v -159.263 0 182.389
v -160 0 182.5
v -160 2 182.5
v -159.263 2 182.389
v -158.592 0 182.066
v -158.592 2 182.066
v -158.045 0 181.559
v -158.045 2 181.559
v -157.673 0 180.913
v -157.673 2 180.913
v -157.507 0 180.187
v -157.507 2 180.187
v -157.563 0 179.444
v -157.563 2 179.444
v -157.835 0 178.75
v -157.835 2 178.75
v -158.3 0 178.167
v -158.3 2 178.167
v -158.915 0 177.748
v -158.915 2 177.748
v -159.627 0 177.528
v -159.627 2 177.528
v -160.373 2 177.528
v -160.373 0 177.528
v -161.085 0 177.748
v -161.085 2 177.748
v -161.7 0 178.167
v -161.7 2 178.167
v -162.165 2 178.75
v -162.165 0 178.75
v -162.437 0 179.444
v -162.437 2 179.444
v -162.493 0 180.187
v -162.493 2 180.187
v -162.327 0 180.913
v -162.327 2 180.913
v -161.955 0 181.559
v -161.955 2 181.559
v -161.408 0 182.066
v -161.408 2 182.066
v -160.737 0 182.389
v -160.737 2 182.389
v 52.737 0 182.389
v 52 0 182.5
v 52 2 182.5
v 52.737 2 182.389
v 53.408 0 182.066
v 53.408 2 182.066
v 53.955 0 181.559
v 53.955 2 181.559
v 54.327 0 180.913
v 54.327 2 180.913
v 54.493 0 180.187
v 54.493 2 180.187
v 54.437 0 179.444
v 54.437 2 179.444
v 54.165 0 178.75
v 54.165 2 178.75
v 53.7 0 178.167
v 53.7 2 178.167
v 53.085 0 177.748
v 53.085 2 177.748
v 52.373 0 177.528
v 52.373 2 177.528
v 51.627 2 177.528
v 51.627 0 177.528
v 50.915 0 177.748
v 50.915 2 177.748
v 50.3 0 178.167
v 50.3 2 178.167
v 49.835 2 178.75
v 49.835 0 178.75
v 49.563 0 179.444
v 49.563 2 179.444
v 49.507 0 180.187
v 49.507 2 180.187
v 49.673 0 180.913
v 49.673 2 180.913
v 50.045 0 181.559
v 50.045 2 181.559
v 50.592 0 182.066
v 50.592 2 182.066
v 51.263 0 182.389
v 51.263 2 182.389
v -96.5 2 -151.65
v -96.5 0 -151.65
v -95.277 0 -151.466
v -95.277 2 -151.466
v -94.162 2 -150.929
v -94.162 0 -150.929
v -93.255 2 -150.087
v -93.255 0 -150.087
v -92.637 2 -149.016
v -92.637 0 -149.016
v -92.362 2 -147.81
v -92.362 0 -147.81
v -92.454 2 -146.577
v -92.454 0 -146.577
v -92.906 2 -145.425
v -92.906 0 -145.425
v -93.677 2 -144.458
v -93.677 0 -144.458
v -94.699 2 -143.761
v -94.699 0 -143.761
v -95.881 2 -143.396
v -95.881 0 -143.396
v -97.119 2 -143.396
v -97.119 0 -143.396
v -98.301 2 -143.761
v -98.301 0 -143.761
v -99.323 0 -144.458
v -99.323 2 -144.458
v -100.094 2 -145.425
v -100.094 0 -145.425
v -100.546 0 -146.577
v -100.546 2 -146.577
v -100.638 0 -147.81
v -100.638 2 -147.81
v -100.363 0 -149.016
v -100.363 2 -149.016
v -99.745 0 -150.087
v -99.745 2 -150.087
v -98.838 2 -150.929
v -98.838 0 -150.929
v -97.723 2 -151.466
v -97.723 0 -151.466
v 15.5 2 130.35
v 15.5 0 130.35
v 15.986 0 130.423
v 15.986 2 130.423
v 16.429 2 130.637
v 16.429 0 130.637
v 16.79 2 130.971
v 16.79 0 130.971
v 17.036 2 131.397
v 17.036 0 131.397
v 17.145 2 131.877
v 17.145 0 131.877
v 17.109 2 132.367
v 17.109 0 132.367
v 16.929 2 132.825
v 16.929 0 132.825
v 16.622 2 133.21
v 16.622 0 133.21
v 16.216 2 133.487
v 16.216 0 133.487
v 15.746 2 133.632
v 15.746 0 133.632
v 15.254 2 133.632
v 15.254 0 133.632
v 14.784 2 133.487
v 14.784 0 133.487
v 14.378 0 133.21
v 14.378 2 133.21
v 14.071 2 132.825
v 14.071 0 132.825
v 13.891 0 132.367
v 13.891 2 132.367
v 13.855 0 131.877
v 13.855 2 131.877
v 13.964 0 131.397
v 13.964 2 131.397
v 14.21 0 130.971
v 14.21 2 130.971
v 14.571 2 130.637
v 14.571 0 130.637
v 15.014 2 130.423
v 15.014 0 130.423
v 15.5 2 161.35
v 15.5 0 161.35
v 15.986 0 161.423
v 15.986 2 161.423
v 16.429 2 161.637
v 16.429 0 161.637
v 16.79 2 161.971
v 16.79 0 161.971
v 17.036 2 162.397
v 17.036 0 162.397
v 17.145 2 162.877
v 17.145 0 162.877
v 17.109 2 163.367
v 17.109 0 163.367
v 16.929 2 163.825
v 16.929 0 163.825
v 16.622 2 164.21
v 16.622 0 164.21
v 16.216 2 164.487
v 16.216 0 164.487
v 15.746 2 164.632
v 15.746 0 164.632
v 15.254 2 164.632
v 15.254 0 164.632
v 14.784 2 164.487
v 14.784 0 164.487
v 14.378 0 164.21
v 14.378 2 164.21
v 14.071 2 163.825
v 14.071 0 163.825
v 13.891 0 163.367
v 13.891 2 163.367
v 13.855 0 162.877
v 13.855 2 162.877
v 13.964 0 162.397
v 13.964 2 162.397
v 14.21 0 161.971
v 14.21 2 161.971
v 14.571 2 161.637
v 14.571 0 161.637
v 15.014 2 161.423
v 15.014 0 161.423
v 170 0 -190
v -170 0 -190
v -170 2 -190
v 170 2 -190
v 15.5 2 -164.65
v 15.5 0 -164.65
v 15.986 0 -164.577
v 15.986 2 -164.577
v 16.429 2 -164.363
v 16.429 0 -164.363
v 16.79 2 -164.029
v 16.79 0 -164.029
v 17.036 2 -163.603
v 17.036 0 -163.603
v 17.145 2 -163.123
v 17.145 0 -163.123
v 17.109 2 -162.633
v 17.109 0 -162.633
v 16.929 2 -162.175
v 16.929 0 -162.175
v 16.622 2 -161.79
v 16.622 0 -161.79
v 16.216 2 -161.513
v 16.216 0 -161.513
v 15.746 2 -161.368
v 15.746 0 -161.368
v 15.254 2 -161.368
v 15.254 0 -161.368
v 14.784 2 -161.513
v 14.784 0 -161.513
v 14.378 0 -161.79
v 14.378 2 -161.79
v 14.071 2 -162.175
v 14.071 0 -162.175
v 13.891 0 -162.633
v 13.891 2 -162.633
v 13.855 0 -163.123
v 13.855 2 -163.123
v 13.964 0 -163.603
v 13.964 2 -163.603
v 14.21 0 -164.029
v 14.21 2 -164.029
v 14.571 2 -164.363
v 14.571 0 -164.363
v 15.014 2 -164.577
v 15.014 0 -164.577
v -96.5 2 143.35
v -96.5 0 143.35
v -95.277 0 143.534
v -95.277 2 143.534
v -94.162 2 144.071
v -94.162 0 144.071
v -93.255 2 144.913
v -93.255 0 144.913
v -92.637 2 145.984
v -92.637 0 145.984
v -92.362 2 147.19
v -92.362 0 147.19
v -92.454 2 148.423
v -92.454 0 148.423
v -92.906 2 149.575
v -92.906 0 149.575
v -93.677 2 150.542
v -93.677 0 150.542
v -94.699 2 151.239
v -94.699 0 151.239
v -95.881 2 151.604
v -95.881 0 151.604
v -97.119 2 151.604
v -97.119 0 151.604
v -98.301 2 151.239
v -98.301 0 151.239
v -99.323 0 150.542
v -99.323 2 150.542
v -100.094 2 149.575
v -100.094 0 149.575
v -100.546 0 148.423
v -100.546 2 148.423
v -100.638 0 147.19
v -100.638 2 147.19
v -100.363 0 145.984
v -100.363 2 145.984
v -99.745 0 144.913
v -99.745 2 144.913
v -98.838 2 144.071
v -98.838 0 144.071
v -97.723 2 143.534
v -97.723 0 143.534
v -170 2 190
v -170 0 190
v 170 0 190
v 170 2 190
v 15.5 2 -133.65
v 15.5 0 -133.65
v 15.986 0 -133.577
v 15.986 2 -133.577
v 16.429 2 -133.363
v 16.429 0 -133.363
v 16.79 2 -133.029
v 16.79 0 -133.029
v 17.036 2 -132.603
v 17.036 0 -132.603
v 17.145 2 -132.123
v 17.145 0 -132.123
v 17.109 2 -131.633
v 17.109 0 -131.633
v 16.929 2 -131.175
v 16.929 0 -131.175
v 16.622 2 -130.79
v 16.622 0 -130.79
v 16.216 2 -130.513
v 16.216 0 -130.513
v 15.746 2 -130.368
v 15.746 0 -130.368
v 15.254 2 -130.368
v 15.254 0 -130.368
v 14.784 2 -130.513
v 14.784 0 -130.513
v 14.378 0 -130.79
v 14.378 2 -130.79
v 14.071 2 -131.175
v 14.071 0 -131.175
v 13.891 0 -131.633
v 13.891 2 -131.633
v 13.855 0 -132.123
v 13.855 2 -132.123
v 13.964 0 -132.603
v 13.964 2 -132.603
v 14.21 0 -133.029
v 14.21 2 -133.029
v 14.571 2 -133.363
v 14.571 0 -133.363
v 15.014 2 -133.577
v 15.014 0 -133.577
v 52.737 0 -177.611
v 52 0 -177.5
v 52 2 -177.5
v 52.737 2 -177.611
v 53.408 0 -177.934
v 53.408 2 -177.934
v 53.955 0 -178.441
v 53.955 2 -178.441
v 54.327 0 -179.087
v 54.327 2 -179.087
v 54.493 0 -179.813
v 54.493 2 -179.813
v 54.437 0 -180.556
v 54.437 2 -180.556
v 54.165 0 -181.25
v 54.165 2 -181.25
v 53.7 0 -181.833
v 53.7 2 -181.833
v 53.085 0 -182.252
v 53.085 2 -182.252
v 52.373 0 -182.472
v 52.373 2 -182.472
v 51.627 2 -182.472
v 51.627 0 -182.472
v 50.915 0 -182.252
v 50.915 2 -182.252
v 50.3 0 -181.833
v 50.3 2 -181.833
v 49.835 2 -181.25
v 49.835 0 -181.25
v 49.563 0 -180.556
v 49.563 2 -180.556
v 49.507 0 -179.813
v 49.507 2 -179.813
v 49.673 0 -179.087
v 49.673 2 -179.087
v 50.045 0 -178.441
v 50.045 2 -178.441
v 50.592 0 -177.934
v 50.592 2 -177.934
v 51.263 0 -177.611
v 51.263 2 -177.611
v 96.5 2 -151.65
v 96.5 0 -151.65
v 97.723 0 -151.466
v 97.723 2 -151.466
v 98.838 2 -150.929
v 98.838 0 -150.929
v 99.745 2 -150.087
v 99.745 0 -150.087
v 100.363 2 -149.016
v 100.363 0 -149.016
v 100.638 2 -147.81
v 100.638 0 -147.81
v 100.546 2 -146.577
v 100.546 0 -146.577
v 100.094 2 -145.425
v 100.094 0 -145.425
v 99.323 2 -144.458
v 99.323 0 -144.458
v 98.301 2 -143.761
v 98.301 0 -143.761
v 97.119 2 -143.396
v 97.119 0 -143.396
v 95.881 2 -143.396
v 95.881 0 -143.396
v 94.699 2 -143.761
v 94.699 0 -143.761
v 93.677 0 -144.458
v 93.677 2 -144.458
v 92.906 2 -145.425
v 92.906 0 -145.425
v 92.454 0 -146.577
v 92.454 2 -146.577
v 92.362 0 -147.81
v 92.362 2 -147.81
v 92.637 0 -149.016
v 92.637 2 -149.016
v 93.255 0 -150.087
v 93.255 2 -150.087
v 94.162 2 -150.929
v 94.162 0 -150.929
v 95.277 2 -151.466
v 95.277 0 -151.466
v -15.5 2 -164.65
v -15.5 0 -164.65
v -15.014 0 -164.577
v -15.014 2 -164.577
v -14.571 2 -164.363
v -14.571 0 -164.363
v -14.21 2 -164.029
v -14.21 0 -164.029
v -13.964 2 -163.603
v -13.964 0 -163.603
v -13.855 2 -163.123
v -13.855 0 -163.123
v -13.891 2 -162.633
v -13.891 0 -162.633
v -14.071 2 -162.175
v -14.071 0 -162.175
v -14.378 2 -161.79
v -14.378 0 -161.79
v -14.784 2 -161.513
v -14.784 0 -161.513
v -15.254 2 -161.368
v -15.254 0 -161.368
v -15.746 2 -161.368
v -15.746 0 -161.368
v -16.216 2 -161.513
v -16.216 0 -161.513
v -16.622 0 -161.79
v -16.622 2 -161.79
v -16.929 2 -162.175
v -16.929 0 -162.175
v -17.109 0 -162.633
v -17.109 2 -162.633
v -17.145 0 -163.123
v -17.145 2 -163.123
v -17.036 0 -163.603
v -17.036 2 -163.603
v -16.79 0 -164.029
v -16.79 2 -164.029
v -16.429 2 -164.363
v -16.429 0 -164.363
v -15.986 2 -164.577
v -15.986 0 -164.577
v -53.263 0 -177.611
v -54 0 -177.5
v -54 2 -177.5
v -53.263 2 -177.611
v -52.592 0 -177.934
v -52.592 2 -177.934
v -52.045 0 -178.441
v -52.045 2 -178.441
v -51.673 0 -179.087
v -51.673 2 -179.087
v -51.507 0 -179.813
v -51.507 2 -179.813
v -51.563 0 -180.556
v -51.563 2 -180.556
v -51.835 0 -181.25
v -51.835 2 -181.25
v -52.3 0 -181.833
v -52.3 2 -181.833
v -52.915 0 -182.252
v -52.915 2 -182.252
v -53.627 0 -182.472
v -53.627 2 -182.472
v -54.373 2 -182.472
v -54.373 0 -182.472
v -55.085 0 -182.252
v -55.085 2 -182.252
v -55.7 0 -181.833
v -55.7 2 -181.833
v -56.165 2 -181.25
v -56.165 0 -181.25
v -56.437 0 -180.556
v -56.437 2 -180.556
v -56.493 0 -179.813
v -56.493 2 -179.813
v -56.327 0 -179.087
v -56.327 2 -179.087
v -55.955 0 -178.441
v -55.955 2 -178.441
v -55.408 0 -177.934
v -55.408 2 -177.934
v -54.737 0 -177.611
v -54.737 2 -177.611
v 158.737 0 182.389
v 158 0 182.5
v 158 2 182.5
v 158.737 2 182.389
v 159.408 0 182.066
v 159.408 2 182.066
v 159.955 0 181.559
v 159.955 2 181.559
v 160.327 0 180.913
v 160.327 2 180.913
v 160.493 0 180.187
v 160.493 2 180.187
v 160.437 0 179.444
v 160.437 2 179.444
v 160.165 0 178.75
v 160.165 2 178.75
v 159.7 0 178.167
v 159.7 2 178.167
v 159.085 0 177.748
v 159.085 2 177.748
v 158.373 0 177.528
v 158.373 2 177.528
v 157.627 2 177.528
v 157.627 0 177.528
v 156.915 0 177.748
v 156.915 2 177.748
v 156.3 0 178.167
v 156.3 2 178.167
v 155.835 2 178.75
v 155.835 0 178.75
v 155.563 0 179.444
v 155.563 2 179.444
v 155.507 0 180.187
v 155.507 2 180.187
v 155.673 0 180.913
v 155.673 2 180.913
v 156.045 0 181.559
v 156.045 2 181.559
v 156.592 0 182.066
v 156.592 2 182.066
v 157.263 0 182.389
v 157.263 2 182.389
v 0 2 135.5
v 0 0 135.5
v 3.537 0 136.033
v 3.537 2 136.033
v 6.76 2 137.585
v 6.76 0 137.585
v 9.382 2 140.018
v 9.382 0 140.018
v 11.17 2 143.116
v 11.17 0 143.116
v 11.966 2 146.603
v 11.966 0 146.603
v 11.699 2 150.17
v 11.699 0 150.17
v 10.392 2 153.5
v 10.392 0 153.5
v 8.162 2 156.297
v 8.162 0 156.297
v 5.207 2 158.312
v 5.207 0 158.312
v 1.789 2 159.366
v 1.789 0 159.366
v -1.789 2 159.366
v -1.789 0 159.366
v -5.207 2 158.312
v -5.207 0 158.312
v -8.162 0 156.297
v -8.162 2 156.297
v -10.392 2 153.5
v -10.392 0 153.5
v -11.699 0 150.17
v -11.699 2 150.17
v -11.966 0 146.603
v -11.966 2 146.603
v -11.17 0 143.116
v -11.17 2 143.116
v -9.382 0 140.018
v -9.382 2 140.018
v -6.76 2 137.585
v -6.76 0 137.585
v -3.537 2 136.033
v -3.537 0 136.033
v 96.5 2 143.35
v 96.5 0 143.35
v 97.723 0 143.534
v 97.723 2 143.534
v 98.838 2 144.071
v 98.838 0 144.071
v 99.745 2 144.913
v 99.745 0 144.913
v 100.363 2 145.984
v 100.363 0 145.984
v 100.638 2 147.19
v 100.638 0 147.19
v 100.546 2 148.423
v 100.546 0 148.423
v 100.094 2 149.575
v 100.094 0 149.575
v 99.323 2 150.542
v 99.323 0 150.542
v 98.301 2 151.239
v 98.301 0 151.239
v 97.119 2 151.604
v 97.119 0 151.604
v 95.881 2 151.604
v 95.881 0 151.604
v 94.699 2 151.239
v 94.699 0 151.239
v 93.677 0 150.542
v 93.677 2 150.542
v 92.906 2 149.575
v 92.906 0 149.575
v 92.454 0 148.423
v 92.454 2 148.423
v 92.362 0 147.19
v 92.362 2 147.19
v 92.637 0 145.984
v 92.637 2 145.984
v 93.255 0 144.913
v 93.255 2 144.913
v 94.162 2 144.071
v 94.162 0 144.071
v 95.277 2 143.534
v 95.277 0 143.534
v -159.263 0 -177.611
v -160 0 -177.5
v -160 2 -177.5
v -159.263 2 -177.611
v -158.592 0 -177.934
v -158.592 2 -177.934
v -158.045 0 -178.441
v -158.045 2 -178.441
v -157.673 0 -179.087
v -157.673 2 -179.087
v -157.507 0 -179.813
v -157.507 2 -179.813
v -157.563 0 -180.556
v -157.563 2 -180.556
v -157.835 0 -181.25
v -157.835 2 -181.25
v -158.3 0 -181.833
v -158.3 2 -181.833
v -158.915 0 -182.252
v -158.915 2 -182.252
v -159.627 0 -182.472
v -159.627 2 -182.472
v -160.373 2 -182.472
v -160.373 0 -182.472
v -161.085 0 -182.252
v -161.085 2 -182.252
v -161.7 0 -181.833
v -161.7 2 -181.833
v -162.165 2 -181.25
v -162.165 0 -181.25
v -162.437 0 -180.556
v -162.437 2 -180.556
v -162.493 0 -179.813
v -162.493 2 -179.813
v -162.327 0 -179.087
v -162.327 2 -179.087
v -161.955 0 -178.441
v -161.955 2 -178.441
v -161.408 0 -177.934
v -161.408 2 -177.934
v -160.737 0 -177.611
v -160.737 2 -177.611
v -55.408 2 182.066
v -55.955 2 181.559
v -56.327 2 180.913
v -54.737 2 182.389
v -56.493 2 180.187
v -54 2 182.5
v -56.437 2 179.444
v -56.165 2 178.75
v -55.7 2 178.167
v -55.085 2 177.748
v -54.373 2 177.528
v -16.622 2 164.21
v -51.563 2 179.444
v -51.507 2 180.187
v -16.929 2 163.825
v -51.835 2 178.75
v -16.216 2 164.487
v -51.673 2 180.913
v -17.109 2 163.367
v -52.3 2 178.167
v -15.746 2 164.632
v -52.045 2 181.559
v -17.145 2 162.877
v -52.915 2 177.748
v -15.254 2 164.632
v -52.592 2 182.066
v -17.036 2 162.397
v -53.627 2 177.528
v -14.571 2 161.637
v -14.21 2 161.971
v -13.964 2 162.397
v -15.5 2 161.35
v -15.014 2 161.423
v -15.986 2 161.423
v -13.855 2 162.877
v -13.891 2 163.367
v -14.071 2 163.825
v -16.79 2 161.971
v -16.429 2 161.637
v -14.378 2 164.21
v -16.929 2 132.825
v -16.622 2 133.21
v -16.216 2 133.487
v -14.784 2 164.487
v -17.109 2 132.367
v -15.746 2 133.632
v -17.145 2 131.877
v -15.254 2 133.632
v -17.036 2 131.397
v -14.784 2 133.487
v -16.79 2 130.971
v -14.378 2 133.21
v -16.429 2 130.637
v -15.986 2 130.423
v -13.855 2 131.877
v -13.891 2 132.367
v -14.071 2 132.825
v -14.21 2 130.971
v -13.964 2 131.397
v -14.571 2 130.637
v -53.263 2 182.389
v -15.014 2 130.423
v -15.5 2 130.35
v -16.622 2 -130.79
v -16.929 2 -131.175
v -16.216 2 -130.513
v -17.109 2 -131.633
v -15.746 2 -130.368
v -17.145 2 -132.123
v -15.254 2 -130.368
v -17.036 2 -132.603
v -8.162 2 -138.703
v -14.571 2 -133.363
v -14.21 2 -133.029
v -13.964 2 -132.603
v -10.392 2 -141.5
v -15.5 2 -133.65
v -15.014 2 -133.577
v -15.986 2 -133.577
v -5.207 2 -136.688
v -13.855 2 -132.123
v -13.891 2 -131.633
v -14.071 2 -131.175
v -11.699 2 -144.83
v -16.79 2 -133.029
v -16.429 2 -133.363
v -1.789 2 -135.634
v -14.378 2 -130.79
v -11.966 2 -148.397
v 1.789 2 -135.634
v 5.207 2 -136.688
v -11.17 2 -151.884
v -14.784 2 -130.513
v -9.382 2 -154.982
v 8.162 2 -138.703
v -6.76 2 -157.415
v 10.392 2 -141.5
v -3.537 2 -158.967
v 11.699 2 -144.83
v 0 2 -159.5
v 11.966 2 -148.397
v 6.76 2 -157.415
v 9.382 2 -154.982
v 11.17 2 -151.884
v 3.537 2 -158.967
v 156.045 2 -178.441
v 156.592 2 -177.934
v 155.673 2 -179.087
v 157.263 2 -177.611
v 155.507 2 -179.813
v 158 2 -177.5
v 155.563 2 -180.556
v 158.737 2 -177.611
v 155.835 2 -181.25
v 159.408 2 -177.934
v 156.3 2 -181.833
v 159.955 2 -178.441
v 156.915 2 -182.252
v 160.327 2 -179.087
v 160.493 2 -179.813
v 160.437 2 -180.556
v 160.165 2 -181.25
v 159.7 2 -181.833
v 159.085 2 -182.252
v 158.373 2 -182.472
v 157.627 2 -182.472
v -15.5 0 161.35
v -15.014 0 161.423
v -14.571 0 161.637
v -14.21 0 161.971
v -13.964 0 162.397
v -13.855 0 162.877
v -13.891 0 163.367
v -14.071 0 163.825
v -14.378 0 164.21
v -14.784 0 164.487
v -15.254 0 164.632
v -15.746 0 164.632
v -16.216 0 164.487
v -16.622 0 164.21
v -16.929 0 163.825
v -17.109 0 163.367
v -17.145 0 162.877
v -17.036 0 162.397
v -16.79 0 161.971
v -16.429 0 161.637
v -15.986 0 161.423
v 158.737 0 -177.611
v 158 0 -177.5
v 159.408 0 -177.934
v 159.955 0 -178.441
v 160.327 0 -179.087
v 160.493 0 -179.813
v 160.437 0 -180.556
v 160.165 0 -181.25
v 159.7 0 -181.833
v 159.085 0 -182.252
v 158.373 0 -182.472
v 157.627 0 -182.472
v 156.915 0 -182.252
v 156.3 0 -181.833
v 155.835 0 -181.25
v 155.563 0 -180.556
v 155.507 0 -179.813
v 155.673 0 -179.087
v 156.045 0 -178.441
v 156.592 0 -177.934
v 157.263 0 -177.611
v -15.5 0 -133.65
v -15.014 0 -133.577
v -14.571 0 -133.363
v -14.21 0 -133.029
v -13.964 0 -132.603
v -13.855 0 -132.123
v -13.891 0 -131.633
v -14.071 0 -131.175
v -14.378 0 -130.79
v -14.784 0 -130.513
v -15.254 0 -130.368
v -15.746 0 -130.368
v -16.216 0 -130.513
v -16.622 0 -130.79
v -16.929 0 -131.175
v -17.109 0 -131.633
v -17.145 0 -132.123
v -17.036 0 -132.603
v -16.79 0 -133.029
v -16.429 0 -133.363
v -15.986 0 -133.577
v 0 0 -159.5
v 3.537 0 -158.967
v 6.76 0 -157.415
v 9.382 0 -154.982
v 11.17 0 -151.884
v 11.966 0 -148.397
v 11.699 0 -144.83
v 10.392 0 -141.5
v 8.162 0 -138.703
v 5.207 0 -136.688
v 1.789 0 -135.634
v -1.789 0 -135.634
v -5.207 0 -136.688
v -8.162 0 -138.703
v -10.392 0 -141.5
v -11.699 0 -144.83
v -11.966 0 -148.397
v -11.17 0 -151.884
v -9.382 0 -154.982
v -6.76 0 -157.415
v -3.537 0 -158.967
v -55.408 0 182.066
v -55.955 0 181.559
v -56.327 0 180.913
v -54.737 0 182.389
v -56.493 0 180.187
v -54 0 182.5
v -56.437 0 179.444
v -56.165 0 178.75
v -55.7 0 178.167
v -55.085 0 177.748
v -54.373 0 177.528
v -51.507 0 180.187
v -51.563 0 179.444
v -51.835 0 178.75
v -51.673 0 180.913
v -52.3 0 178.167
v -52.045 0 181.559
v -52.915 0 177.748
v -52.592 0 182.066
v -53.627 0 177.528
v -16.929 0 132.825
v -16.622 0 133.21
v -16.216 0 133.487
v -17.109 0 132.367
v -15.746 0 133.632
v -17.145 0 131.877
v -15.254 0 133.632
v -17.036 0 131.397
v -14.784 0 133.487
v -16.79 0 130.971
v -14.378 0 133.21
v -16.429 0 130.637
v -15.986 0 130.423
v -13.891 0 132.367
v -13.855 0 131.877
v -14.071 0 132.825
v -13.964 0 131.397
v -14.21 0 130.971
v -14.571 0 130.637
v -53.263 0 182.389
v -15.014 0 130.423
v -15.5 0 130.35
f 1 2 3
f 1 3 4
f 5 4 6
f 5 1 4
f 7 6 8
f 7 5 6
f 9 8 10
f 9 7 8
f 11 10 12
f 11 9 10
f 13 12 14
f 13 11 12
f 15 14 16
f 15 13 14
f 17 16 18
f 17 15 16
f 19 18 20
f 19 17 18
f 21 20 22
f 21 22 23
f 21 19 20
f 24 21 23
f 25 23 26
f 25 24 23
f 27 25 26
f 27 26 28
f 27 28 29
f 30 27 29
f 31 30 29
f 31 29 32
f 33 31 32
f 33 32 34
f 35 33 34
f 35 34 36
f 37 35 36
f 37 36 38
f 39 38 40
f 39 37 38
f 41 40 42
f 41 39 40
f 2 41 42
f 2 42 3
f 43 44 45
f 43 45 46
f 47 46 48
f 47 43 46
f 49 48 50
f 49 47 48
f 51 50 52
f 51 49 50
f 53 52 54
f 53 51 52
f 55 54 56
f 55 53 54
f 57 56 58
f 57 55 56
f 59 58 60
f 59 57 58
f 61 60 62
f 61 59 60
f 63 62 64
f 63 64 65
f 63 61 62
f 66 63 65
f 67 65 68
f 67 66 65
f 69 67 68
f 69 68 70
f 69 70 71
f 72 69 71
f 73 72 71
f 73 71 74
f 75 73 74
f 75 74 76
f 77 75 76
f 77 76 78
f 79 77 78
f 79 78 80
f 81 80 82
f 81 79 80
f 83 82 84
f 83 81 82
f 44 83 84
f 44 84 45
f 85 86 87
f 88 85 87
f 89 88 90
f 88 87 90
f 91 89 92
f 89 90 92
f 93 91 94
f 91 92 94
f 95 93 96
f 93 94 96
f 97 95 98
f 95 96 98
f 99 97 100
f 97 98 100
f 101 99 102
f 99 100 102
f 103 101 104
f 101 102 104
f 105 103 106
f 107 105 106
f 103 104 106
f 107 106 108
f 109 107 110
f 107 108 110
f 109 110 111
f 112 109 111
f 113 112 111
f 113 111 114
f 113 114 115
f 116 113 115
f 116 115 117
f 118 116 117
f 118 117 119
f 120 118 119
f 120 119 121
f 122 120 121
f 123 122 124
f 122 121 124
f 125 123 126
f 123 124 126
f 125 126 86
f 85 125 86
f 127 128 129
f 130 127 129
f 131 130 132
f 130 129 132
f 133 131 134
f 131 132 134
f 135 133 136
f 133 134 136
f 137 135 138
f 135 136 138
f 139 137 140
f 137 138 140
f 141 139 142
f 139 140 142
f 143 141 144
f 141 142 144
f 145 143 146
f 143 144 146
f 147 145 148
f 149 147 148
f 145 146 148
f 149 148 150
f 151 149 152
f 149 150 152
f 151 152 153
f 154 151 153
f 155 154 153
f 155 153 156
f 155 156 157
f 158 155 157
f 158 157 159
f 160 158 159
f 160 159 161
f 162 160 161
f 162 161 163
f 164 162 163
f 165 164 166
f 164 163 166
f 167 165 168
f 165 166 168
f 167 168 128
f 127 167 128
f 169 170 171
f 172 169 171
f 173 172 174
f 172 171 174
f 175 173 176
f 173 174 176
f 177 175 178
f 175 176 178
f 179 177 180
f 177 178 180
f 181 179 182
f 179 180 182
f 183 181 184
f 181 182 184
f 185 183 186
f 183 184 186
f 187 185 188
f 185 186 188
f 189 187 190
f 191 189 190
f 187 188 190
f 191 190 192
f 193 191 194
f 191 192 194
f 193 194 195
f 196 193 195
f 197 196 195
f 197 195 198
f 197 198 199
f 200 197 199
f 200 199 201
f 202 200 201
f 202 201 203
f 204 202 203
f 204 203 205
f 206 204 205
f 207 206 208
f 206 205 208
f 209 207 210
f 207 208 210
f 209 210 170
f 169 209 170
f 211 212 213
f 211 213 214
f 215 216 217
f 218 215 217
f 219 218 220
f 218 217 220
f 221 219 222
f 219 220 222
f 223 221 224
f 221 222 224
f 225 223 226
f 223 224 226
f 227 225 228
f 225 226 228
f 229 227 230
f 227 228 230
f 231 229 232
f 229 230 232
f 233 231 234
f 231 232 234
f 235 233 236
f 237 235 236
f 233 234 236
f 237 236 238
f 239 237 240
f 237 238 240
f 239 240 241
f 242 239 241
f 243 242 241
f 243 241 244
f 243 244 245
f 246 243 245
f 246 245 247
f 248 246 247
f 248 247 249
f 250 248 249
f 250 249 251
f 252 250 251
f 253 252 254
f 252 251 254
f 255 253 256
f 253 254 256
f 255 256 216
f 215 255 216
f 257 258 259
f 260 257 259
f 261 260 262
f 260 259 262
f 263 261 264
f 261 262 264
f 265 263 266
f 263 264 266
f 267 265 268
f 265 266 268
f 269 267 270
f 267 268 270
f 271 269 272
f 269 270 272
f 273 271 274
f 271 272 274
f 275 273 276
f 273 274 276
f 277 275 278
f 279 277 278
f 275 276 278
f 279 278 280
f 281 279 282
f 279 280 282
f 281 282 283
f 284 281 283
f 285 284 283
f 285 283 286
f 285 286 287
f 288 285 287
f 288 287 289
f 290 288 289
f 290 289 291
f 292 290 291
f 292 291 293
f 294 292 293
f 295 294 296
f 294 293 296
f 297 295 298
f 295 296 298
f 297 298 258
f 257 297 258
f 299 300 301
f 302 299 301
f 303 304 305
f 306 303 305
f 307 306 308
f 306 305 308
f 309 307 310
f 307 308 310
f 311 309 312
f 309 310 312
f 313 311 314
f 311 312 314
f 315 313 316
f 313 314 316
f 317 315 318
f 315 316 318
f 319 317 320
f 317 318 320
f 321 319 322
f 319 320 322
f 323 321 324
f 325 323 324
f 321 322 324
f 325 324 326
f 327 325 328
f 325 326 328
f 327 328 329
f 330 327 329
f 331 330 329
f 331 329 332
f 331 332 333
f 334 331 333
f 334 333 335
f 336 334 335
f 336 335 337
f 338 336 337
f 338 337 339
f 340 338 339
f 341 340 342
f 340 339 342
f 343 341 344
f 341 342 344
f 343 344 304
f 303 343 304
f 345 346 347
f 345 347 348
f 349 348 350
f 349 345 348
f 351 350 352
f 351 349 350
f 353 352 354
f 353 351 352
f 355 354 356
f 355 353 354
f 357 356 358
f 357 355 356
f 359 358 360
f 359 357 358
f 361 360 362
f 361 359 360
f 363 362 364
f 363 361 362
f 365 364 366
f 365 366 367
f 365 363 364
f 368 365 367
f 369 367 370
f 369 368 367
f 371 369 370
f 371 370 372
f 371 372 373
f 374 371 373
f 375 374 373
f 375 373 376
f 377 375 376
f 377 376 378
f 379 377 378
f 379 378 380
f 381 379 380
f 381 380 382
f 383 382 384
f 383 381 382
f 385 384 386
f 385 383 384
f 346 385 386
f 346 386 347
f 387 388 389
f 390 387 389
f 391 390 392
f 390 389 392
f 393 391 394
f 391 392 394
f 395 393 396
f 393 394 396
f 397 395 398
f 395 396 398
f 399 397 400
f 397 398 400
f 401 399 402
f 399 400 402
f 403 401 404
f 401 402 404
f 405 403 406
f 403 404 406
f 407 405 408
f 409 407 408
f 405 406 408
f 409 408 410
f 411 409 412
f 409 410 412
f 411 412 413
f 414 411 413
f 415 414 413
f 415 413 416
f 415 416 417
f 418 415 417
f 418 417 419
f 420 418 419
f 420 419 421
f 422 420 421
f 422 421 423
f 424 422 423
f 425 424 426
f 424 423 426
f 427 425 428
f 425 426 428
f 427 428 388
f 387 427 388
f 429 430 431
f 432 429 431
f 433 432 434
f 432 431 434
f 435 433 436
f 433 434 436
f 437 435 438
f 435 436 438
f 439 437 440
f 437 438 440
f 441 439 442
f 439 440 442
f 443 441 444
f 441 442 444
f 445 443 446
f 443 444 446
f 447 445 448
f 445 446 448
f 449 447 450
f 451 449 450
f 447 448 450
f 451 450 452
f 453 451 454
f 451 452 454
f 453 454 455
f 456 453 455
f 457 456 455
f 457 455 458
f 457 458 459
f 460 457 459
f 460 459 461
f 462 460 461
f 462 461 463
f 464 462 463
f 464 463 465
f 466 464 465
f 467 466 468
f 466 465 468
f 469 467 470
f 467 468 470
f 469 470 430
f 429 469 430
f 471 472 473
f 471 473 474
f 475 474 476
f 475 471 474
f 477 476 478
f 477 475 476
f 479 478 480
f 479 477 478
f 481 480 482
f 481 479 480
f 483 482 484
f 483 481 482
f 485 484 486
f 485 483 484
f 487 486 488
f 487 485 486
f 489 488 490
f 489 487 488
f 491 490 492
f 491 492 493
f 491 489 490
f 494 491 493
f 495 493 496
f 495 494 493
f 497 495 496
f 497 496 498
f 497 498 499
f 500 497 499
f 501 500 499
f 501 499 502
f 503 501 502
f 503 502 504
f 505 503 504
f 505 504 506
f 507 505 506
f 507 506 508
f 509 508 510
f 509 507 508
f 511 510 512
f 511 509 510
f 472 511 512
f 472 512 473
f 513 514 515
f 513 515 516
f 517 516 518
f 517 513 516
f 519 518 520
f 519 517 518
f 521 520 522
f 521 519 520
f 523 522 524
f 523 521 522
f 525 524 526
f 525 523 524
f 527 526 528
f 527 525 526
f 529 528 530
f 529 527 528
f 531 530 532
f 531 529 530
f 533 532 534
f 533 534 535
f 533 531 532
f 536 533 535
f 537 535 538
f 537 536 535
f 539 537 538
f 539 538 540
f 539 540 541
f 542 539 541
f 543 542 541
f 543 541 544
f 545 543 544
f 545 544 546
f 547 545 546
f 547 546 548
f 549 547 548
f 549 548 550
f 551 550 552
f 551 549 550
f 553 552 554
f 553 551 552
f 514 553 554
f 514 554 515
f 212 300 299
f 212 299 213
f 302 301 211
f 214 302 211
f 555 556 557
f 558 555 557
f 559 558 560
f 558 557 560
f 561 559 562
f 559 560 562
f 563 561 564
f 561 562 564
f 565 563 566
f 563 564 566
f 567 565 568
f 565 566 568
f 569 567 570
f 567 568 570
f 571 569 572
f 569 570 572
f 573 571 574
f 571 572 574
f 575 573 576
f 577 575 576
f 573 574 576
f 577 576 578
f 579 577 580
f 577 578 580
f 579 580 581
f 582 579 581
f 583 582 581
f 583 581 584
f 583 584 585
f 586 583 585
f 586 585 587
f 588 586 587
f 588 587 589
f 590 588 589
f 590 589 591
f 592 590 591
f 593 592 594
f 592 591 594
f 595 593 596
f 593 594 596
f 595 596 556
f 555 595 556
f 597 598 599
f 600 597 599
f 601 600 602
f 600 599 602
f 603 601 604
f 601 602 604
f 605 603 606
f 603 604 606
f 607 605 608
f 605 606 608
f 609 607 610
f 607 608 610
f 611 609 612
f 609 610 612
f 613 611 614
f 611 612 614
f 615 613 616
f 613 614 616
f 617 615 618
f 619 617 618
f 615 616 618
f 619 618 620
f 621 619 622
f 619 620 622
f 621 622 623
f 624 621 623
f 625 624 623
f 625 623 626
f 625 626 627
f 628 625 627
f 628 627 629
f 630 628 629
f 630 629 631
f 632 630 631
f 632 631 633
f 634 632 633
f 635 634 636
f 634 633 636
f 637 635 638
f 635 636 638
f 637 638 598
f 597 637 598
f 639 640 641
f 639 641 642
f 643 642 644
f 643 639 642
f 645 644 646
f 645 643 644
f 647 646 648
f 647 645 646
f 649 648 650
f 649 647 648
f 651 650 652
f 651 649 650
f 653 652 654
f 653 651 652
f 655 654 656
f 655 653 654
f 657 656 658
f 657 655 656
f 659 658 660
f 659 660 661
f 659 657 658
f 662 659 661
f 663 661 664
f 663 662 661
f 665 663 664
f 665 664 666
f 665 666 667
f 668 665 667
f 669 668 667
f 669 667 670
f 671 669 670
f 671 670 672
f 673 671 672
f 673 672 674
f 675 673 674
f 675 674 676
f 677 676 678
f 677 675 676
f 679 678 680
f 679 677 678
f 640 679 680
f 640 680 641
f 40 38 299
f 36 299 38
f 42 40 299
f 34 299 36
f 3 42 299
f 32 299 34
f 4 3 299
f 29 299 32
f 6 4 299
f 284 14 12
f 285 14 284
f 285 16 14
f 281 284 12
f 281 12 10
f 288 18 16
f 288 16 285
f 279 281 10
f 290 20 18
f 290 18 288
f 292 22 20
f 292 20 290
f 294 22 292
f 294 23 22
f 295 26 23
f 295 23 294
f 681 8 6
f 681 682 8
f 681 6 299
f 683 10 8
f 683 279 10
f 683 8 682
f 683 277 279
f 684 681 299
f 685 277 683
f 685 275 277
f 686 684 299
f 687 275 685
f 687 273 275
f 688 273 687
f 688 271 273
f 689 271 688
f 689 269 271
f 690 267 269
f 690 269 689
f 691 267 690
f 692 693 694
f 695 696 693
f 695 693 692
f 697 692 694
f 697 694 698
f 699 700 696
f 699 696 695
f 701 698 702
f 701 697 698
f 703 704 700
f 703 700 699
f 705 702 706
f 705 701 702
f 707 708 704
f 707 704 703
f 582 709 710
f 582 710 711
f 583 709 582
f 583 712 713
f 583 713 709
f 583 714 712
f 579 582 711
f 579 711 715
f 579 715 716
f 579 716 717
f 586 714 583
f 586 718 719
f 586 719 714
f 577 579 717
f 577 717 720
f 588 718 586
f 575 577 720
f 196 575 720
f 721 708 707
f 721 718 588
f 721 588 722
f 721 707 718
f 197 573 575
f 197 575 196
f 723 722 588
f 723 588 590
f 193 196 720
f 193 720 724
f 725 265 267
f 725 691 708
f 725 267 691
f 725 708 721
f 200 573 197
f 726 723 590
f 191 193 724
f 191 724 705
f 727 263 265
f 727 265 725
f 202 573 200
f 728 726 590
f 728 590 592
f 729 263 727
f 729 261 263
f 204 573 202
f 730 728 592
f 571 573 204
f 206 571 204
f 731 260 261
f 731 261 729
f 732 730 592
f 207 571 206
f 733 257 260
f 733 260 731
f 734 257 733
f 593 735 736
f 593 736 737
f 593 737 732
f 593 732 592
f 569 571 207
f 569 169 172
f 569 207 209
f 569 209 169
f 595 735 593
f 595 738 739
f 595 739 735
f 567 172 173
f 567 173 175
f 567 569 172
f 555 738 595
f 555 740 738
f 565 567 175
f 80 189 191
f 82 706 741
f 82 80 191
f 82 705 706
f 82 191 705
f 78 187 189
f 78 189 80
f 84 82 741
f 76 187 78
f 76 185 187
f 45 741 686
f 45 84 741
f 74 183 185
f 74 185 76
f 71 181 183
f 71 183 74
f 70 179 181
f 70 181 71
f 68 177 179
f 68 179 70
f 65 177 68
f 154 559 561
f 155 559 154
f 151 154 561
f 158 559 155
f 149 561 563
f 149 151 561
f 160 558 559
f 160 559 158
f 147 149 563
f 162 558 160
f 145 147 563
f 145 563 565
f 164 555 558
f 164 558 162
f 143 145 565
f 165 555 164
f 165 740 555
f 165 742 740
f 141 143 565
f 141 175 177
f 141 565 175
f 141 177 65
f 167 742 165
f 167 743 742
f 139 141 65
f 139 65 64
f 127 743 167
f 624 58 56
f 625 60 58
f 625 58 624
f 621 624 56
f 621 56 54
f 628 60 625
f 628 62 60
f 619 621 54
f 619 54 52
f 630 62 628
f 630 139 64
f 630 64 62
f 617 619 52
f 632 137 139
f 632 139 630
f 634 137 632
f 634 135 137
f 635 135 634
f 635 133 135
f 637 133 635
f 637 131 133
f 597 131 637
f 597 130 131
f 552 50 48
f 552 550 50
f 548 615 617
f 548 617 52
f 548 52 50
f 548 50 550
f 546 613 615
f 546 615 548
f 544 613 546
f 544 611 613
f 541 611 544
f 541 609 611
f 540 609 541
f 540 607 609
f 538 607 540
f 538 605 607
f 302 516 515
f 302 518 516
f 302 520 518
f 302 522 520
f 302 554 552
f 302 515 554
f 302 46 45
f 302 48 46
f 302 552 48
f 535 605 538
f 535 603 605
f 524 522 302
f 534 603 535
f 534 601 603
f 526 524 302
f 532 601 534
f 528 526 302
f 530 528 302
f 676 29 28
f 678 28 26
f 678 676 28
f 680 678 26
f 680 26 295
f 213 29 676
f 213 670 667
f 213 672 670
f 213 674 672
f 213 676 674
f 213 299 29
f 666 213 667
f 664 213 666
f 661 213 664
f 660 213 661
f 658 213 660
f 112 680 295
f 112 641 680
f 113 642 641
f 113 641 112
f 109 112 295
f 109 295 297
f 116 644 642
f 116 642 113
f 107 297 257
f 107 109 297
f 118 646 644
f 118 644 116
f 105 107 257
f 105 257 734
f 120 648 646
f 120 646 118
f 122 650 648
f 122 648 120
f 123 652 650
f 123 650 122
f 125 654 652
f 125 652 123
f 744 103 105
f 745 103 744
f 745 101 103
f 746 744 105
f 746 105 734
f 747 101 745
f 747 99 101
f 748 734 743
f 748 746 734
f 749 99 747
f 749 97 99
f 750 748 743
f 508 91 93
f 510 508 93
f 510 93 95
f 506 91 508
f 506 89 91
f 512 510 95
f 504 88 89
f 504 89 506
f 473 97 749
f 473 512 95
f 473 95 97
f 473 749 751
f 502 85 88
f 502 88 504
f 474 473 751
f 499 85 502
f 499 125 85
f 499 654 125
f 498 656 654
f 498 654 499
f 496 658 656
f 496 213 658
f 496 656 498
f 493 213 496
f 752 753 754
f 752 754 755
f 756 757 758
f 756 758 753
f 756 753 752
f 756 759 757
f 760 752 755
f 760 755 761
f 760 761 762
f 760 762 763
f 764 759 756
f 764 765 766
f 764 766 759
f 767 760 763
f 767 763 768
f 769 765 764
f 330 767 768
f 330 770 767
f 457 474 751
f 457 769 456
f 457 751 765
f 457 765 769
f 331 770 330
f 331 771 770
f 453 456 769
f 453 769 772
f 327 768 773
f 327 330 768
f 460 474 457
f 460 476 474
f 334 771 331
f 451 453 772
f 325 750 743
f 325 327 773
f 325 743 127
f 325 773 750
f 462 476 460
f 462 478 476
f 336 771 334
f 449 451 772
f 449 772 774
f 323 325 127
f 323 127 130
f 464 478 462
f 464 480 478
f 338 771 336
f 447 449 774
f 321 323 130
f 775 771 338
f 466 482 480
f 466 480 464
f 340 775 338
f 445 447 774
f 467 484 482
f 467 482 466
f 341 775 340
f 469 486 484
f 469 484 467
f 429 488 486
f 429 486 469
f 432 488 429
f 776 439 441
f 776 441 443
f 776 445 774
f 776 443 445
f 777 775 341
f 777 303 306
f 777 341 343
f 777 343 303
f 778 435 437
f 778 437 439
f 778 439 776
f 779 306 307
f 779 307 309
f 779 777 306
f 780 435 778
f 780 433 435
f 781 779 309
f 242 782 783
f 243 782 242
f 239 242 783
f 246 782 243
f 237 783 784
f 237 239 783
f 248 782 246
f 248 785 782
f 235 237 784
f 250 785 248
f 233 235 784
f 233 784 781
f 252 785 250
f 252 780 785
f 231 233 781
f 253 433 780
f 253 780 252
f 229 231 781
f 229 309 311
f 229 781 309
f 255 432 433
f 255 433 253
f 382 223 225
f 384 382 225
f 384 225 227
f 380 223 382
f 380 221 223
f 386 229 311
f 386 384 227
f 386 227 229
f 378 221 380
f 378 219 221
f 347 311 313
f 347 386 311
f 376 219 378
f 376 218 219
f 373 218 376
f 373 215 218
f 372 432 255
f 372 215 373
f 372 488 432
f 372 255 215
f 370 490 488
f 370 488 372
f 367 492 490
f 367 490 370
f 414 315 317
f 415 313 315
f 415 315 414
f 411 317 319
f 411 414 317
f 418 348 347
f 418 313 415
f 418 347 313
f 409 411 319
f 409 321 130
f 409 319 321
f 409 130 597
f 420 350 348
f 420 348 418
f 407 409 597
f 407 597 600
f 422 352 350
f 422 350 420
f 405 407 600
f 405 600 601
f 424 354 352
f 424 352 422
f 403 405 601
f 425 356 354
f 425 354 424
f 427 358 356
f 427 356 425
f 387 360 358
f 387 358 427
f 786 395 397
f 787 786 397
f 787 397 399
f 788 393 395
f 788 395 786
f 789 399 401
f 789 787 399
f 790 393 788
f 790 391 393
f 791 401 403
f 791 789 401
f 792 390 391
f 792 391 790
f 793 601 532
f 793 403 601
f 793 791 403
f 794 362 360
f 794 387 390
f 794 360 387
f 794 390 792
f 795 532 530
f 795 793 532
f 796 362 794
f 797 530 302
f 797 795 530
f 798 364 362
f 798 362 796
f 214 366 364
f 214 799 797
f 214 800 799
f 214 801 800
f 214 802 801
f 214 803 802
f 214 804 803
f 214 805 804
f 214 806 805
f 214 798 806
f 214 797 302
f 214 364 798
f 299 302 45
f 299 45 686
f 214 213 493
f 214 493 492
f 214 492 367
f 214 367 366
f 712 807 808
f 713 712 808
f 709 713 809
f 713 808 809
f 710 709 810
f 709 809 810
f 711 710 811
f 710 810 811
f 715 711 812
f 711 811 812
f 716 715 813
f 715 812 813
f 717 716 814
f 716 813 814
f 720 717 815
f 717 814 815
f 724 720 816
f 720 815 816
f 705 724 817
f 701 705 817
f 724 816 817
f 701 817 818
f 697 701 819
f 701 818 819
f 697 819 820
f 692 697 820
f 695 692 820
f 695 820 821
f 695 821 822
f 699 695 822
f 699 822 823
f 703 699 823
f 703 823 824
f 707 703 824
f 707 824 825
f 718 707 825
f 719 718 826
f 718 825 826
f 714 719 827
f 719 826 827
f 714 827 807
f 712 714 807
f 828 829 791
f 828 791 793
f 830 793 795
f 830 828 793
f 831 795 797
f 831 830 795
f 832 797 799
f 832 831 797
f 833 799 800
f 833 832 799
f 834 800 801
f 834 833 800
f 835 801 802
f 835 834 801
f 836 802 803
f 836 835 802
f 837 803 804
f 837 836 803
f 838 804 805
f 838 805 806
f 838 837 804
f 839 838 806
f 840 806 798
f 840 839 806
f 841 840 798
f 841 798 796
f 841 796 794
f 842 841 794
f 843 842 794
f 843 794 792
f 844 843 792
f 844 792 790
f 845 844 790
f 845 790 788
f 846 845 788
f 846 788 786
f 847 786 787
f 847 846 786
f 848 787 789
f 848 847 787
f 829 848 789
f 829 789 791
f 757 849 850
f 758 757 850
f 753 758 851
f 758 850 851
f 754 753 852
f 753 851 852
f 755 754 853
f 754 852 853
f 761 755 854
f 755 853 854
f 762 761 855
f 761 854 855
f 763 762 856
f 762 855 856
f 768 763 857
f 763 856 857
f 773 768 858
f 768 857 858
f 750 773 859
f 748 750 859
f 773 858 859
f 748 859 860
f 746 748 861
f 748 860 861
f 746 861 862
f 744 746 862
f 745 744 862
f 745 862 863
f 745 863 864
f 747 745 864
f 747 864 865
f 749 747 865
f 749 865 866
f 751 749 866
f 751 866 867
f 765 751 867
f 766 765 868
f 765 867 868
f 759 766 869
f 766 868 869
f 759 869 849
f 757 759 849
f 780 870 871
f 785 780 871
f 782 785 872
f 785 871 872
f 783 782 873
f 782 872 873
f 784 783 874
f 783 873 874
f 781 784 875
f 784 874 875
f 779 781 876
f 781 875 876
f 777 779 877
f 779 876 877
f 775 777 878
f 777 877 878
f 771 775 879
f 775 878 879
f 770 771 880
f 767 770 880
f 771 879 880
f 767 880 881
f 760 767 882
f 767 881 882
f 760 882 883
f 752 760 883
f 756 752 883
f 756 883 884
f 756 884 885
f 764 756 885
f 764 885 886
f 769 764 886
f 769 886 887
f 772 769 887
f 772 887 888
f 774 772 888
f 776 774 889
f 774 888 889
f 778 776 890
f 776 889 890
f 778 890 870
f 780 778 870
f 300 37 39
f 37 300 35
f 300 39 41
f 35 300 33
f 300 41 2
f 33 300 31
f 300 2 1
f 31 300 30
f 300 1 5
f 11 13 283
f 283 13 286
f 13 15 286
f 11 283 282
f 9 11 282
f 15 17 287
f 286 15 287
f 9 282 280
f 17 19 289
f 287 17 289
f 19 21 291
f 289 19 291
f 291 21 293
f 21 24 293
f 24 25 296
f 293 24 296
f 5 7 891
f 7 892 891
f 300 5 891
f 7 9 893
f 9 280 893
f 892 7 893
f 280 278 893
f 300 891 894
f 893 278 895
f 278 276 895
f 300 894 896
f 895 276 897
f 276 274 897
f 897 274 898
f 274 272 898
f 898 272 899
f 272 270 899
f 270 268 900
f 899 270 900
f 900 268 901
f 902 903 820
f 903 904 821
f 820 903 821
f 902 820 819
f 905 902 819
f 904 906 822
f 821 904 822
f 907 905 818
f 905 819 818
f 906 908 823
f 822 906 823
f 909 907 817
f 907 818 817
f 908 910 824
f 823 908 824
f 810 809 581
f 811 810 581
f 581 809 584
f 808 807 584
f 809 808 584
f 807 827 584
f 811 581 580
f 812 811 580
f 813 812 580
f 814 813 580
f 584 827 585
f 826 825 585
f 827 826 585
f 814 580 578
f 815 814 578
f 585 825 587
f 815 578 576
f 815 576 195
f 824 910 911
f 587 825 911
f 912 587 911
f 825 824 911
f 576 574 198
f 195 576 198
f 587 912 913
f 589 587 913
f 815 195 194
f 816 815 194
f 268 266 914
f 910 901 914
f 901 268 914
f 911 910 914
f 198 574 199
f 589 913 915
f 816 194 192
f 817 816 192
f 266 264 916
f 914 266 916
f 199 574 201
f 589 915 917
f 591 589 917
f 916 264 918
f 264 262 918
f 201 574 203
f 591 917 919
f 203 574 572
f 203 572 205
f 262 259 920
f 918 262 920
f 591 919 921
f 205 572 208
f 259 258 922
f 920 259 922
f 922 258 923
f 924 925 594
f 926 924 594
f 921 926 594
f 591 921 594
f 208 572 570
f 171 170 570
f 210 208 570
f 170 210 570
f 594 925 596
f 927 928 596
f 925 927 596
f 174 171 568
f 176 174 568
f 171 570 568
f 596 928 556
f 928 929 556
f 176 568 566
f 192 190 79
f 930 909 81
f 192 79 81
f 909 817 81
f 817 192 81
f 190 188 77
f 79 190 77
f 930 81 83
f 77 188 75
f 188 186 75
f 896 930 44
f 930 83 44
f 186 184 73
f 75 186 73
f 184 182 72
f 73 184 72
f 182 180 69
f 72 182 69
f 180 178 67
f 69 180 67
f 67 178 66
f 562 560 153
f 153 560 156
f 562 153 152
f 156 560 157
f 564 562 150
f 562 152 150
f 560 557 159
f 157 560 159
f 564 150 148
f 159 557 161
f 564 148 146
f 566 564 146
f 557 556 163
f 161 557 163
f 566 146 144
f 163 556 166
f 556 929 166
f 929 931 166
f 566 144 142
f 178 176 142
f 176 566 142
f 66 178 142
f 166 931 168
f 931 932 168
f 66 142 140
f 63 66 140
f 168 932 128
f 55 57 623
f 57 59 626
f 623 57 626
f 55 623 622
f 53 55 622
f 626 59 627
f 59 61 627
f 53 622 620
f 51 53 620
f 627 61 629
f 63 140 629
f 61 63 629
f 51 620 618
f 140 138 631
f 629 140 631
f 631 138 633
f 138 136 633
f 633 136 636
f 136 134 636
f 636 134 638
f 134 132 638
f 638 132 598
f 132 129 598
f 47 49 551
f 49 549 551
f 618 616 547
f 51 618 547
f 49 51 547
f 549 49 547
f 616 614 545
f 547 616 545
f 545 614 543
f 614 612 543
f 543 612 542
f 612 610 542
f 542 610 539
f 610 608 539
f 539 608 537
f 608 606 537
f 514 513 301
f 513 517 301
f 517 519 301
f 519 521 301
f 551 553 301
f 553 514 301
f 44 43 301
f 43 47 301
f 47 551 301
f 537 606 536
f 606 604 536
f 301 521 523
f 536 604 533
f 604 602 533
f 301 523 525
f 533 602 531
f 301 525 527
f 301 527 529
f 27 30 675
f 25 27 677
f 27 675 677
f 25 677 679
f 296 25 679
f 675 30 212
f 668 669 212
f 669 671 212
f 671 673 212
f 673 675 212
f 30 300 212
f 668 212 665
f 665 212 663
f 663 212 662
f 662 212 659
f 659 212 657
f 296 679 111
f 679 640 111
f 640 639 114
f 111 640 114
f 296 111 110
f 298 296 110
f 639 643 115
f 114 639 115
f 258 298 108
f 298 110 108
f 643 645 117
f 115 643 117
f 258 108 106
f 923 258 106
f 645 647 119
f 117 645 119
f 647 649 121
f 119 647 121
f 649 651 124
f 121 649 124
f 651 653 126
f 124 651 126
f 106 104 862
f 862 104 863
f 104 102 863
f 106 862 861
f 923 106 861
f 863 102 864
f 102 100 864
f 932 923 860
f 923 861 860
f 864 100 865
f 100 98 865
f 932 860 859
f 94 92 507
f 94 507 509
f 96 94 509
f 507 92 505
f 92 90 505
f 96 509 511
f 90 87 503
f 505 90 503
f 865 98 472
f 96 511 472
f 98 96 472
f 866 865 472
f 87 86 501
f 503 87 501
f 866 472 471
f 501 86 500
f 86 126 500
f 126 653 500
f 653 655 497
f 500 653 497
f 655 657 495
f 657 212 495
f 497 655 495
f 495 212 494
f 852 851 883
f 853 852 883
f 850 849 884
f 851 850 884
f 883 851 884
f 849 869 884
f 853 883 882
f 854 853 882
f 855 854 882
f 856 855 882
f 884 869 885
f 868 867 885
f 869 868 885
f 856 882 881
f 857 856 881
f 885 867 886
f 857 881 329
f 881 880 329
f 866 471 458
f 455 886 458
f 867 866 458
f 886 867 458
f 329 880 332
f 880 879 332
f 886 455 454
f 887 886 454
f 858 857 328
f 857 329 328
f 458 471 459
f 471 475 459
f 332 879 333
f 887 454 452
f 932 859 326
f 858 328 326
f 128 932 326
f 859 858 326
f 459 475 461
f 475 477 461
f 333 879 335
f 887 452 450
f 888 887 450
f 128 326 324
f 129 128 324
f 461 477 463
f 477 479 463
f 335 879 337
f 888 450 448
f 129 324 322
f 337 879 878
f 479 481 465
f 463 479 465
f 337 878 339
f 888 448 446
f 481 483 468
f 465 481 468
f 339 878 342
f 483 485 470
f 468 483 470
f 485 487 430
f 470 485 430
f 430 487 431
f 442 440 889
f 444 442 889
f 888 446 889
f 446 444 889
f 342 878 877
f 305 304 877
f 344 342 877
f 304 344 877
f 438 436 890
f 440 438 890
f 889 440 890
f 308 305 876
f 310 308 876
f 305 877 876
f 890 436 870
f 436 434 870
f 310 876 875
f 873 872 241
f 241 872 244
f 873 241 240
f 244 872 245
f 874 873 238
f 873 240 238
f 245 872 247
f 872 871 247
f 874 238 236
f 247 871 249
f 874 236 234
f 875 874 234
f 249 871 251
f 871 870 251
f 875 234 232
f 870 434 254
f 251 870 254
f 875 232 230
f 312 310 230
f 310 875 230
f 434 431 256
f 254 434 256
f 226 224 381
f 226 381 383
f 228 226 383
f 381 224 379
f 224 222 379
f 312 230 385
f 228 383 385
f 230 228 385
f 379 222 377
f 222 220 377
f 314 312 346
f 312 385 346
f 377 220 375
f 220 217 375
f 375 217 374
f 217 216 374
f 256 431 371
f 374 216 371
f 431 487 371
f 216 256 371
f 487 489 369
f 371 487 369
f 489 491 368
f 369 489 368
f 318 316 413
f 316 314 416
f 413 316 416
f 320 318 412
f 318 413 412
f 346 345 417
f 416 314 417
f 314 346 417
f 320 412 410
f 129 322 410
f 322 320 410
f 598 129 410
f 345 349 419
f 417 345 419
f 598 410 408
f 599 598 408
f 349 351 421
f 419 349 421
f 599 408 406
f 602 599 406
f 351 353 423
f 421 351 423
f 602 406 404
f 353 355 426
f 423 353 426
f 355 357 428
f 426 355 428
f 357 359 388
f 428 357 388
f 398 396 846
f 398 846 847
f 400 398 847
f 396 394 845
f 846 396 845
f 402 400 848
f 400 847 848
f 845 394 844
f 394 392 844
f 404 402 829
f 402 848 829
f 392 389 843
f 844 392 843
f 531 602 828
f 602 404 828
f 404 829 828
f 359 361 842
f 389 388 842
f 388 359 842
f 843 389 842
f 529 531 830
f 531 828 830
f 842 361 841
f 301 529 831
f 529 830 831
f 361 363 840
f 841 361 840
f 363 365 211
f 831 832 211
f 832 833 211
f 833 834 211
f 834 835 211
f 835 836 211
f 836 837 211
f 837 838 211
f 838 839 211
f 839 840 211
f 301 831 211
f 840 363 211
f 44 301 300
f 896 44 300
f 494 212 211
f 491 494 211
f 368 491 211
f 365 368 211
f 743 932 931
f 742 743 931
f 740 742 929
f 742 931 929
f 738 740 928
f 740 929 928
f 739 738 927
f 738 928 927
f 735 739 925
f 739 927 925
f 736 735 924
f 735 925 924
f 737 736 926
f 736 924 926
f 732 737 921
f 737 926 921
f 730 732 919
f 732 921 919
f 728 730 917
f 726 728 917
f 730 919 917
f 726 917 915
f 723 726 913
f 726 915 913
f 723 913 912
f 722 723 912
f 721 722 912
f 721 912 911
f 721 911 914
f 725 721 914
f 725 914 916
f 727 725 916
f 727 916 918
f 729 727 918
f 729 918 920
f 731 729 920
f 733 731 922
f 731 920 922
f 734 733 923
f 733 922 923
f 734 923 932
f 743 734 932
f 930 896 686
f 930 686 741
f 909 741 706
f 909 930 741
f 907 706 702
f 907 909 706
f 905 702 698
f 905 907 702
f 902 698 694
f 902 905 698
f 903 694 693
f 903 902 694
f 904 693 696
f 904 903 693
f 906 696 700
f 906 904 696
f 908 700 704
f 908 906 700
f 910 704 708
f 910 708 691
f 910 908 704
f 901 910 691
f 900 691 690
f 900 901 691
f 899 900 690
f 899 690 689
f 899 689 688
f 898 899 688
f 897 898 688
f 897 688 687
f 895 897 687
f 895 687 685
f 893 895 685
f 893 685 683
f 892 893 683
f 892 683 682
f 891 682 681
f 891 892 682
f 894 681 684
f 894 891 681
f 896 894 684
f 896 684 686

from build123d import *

# Parameters (mm, degrees)
SKICA1_W                 = 340
SKICA1_H                 = 380
SKICA1_R                 = 2.5
P_IDAT_VYSUNUT_M1_DEPTH  = 2
SKICA2_R                 = 1.650000196
SKICA2_R_2               = 1.649999612
SKICA2_R_3               = 4.150000099
SKICA2_R_4               = 4.149999924
SKICA2_R_5               = 4.149999975
SKICA2_R_6               = 4.150000026
SKICA2_R_7               = 12
ODEBRAT_VYSUNUT_M1_DEPTH = 2


with BuildPart() as part:
    # Skica1 → Přidat vysunutím1 (new body)
    with BuildSketch(Plane(origin=(0, 0, 0), x_dir=(1, 0, 0), z_dir=(0, 1, 0))):
        Rectangle(SKICA1_W, SKICA1_H)
        with Locations(Location((-160, 180, 0), (0, 0, 270))):
            Circle(SKICA1_R, mode=Mode.SUBTRACT)
        with Locations(Location((-54, 180, 0), (0, 0, 270))):
            Circle(SKICA1_R, mode=Mode.SUBTRACT)
        with Locations(Location((52, 180, 0), (0, 0, 270))):
            Circle(SKICA1_R, mode=Mode.SUBTRACT)
        with Locations(Location((158, 180, 0), (0, 0, 270))):
            Circle(SKICA1_R, mode=Mode.SUBTRACT)
        with Locations(Location((-54, -180, 0), (0, 0, 270))):
            Circle(SKICA1_R, mode=Mode.SUBTRACT)
        with Locations(Location((52, -180, 0), (0, 0, 270))):
            Circle(SKICA1_R, mode=Mode.SUBTRACT)
        with Locations(Location((158, -180, 0), (0, 0, 270))):
            Circle(SKICA1_R, mode=Mode.SUBTRACT)
        with Locations(Location((-160, -180, 0), (0, 0, 270))):
            Circle(SKICA1_R, mode=Mode.SUBTRACT)
    extrude(amount=P_IDAT_VYSUNUT_M1_DEPTH)

    # Skica2 → Odebrat vysunutím1 (cut)
    with BuildSketch(Plane.XZ):
        with Locations(Location((15.500000611, 162.999999867, 0), (0, 0, 270))):
            Circle(SKICA2_R)
        with Locations(Location((-15.499999389, 162.999999867, 0), (0, 0, 270))):
            Circle(SKICA2_R)
        with Locations(Location((-15.499999389, 131.999999867, 0), (0, 0, 270))):
            Circle(SKICA2_R)
        with Locations(Location((15.500000611, 131.999999867, 0), (0, 0, 270))):
            Circle(SKICA2_R)
        with Locations(Location((15.499999439, -162.999999266, 0), (0, 0, 270))):
            Circle(SKICA2_R_2)
        with Locations(Location((-15.500000561, -162.999999266, 0), (0, 0, 270))):
            Circle(SKICA2_R_2)
        with Locations(Location((-15.500000561, -131.999999266, 0), (0, 0, 270))):
            Circle(SKICA2_R_2)
        with Locations(Location((15.499999439, -131.999999266, 0), (0, 0, 270))):
            Circle(SKICA2_R_2)
        with Locations(Location((96.499999368, -147.499999005, 0), (0, 0, 270))):
            Circle(SKICA2_R_3)
        with Locations(Location((-96.499999659, -147.499999158, 0), (0, 0, 270))):
            Circle(SKICA2_R_4)
        with Locations(Location((-96.500017816, 147.499999068, 0), (0, 0, 270))):
            Circle(SKICA2_R_5)
        with Locations(Location((96.499999563, 147.499999035, 0), (0, 0, 270))):
            Circle(SKICA2_R_6)
        with Locations(Location((0, -147.499999158, 0), (0, 0, 270))):
            Circle(SKICA2_R_7)
        with Locations(Location((0, 147.499999035, 0), (0, 0, 270))):
            Circle(SKICA2_R_7)
    extrude(amount=-ODEBRAT_VYSUNUT_M1_DEPTH, mode=Mode.SUBTRACT)


solid = part.part
